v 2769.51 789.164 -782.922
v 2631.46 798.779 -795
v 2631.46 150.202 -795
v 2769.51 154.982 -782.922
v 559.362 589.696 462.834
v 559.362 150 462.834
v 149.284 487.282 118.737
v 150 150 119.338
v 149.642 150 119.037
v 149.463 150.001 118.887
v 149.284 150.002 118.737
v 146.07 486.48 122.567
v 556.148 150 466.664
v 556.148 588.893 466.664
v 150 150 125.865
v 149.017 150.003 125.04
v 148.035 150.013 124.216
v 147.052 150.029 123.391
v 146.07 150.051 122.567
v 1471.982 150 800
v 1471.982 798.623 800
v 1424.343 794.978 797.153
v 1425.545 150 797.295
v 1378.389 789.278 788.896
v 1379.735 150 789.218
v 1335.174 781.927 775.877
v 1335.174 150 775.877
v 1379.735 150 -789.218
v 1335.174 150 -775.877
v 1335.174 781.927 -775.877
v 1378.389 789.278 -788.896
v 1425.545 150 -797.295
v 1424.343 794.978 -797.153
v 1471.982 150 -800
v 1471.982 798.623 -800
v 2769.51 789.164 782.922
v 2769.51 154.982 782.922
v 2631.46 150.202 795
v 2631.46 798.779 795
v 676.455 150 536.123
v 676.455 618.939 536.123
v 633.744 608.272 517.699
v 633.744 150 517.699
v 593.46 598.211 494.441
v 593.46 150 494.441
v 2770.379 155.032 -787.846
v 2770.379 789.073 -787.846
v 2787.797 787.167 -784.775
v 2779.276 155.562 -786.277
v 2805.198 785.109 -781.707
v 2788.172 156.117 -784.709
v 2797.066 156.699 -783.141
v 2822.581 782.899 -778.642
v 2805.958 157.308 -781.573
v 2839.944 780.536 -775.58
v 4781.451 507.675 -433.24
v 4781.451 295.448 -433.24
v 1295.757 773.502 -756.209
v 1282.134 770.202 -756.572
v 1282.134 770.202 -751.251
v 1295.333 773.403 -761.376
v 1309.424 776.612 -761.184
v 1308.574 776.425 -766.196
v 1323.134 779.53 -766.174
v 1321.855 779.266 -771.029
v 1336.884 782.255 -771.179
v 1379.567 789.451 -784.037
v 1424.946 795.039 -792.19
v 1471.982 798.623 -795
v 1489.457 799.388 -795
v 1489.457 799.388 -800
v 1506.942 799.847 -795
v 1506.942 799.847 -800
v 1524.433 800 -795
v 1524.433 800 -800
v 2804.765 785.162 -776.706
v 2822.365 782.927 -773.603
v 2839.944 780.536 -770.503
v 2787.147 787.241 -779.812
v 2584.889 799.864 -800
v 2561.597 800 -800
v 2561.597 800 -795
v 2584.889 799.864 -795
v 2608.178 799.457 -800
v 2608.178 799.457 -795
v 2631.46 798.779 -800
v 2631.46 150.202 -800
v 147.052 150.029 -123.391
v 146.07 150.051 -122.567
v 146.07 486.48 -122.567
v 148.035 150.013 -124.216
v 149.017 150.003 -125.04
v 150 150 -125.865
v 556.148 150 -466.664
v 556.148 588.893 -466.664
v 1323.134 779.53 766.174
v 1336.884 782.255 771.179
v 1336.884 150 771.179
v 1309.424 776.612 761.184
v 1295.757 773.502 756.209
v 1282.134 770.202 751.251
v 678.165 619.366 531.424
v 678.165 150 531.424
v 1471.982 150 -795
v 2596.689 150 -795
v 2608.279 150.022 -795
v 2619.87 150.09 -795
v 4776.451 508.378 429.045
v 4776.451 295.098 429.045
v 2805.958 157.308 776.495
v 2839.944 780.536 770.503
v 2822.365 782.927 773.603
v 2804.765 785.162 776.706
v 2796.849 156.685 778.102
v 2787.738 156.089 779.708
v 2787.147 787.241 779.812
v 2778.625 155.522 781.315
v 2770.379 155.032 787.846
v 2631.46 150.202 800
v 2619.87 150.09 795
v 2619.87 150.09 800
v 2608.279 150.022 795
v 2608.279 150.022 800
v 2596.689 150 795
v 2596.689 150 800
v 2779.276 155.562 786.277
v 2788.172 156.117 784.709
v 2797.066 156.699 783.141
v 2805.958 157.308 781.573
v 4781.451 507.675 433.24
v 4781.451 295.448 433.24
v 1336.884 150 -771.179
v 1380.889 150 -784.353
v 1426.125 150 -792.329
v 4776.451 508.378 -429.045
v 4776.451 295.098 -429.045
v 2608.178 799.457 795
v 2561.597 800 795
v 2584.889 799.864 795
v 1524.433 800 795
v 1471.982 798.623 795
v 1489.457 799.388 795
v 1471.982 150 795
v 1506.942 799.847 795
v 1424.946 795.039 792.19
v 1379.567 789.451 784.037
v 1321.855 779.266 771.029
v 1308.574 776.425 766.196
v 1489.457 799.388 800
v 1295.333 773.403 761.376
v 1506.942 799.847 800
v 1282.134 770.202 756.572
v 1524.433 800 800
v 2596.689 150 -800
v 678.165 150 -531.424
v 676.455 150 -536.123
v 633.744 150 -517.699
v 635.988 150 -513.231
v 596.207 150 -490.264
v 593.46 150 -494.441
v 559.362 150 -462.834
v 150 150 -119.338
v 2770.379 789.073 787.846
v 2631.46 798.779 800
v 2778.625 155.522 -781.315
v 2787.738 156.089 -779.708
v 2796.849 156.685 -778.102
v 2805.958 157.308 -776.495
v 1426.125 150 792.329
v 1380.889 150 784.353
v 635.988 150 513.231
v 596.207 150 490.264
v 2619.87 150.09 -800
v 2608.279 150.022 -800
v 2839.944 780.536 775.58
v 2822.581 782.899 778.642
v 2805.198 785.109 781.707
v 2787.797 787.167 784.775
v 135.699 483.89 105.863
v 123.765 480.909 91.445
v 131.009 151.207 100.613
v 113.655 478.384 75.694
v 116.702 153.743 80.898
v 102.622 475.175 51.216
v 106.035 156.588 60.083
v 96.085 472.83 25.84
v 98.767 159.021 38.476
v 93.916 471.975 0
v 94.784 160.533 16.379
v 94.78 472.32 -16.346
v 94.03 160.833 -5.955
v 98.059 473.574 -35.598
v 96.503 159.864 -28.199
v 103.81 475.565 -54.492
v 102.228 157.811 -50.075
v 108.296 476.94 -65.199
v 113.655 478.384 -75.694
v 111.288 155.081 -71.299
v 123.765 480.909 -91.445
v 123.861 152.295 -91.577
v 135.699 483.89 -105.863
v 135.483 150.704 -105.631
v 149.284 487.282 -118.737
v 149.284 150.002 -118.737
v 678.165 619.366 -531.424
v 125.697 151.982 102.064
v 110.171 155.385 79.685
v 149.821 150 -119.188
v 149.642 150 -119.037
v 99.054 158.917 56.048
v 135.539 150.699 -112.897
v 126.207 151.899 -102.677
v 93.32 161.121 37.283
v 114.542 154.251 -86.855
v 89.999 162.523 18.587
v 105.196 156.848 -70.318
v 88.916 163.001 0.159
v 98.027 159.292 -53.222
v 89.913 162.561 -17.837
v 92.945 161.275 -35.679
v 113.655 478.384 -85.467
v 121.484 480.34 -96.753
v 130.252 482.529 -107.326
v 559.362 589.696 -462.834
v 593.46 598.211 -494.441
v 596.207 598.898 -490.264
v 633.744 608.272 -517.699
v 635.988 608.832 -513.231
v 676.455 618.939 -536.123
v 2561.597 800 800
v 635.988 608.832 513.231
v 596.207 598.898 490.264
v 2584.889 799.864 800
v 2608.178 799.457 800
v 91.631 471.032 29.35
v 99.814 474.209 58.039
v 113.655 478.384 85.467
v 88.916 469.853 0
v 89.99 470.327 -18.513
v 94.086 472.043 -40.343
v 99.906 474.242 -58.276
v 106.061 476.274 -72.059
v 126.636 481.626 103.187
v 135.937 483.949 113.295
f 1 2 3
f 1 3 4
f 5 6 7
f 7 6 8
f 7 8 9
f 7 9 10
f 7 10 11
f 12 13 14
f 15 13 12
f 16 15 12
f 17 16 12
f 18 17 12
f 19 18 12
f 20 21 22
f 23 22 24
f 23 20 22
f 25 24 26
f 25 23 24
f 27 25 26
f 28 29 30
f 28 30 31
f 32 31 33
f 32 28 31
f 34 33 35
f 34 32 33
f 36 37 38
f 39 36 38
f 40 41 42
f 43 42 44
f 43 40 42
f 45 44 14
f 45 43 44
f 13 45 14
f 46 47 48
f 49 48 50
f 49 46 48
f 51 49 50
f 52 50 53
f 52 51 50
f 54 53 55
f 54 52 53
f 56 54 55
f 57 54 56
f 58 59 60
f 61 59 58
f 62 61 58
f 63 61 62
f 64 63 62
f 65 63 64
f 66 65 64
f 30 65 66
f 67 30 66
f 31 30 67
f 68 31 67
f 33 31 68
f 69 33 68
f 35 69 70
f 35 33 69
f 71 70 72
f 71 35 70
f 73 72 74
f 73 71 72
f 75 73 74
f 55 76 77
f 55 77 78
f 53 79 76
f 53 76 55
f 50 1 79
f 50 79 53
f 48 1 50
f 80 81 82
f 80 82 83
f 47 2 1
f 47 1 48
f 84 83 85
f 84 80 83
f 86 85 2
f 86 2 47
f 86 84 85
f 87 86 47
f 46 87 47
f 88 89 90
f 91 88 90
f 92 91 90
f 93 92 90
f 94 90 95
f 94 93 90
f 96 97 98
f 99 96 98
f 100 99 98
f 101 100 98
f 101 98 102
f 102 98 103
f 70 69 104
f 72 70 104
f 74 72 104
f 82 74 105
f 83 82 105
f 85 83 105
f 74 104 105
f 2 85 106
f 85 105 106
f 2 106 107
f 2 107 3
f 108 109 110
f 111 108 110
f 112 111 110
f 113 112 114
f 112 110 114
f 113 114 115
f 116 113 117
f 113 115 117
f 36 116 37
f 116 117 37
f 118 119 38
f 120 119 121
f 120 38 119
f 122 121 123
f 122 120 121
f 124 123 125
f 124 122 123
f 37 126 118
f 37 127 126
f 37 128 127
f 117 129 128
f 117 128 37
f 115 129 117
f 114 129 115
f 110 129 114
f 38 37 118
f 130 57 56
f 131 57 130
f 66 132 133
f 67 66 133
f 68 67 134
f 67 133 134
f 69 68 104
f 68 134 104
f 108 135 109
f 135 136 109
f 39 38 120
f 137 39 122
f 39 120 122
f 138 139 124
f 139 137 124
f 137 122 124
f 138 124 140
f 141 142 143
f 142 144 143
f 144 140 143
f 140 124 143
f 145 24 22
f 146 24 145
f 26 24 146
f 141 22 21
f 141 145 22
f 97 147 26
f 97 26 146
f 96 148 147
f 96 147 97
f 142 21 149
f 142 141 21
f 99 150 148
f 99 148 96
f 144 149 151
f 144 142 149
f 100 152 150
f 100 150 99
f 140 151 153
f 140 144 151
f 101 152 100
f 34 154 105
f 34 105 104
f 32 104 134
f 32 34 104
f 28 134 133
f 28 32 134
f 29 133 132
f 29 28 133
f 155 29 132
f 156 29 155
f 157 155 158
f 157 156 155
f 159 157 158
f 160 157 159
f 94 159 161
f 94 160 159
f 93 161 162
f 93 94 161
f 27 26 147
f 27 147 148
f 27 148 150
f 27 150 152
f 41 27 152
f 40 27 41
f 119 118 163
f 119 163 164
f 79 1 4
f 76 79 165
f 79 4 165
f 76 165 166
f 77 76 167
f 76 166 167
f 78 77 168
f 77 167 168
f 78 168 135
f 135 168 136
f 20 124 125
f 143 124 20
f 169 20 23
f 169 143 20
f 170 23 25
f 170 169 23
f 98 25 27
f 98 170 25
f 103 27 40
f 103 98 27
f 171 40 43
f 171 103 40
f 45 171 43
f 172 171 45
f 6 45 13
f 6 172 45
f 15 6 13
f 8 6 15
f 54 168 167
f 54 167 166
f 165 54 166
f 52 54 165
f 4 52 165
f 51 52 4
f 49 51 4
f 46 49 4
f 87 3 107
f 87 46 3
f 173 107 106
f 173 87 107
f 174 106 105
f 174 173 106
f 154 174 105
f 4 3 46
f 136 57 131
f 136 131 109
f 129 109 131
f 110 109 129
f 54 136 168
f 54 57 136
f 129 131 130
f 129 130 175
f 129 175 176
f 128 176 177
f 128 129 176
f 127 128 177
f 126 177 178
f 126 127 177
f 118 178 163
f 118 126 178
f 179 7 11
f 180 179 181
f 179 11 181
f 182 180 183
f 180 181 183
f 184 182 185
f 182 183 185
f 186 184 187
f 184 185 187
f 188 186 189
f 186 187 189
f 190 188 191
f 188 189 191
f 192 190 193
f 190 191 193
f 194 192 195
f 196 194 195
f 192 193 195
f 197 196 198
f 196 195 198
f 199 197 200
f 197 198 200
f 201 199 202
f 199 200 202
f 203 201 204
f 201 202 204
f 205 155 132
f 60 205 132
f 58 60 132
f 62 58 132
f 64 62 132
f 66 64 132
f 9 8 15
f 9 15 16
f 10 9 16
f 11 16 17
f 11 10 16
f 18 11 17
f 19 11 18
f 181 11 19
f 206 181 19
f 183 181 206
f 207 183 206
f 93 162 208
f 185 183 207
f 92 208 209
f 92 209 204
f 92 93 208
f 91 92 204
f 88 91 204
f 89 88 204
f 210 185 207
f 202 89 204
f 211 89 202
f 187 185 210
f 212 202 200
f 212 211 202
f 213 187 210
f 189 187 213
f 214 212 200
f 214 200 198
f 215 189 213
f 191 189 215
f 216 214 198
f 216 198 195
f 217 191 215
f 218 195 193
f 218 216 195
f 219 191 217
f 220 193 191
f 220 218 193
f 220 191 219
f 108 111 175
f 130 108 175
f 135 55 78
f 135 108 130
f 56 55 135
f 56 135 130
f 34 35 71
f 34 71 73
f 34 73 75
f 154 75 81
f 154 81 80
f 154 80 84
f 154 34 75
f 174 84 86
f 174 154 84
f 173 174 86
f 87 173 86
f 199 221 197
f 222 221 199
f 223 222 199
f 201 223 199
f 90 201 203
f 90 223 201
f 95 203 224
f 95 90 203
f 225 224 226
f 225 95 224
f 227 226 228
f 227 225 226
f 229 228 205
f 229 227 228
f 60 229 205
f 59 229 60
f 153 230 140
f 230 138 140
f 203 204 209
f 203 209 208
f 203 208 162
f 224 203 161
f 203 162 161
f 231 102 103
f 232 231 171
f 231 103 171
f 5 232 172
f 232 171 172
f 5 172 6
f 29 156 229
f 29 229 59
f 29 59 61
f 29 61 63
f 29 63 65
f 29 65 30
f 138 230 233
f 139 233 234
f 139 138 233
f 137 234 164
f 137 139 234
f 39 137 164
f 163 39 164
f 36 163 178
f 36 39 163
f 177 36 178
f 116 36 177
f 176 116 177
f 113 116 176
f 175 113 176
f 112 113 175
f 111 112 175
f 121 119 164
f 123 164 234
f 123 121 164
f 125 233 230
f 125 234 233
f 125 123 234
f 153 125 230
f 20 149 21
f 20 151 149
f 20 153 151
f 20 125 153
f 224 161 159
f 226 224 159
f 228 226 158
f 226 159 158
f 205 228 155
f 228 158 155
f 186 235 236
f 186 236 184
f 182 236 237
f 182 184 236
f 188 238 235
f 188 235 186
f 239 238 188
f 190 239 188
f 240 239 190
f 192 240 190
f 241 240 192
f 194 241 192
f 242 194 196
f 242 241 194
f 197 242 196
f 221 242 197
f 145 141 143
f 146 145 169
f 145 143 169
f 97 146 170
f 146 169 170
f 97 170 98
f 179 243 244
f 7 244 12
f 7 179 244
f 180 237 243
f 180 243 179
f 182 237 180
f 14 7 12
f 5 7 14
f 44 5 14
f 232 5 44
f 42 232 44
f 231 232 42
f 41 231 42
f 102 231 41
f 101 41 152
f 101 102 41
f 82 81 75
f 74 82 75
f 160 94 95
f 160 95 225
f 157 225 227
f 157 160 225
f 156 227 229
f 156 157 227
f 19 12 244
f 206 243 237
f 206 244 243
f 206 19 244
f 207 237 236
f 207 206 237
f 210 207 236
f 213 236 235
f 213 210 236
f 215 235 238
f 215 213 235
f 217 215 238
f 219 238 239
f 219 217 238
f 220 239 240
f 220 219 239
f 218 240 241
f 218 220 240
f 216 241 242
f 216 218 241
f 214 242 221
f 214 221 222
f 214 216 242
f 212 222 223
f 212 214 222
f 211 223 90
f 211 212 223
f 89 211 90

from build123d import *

# Parameters (mm, degrees)
TOPVIEW_EXTRUDE_DEPTH      = 800
SHELL1_T                   = -5
SIDEPROFILE_CUT_DEPTH      = 4914.47877429
SIDEPROFILE_CUT_DEPTH_BACK = 4914.47877429
SKETCH2_OUTSIDE_W          = 5698.923
SKETCH2_OUTSIDE_H          = 1806.388


with BuildPart() as part:
    # Sketch1 → TopView_Extrude (new body)
    with BuildSketch(Plane(origin=(0, 0, 0), x_dir=(1, 0, 0), z_dir=(0, 1, 0))):
        with BuildLine():
            Line((146.069849076, 122.567124227), (556.148324977, 466.663731547))
            ThreePointArc((556.148324977, 466.663731547), (613.263316637, 506.656075273), (676.455195963, 536.122941687))
            Line((676.455195963, 536.122941687), (1335.173700718, 775.877020708))
            ThreePointArc((1335.173700718, 775.877020708), (1402.522523085, 793.923094197), (1471.981833896, 800))
            Line((1471.981833896, 800), (2631.460091708, 800))
            ThreePointArc((2631.460091708, 800), (2701.184663634, 796.955760422), (2770.378589806, 787.846210174))
            Line((2770.378589806, 787.846210174), (4781.451, 433.24))
            Line((4781.451, 433.24), (4781.451, -433.24))
            Line((4781.451, -433.24), (2770.378589806, -787.846210174))
            ThreePointArc((2770.378589806, -787.846210174), (2701.184663634, -796.955760422), (2631.460091708, -800))
            Line((2631.460091708, -800), (1471.981833896, -800))
            ThreePointArc((1471.981833896, -800), (1402.522523085, -793.923094197), (1335.173700718, -775.877020708))
            Line((1335.173700718, -775.877020708), (676.455195963, -536.122941687))
            ThreePointArc((676.455195963, -536.122941687), (613.263316637, -506.656075273), (556.148324977, -466.663731547))
            Line((556.148324977, -466.663731547), (146.069849076, -122.567124227))
            ThreePointArc((146.069849076, -122.567124227), (88.915850742, 0), (146.069849076, 122.567124227))
        make_face()
    extrude(amount=TOPVIEW_EXTRUDE_DEPTH)

    # Shell1
    shell1_openings = [part.faces().sort_by_distance(p)[0] for p in [
        (2472.186486347, 0, 0),
        (2472.186486347, 800, 0),
    ]]
    offset(amount=SHELL1_T, openings=shell1_openings, kind=Kind.INTERSECTION)

    # Sketch2 outside → SideProfile_Cut (cut, two sides: drawn at the far end of the back side and taken through both)
    with BuildSketch(Plane.XY.offset(-SIDEPROFILE_CUT_DEPTH_BACK)):
        with Locations((2435.1835, 400)):
            Rectangle(SKETCH2_OUTSIDE_W, SKETCH2_OUTSIDE_H)
        with BuildLine():
            Line((0, 300), (0, 332.854125267))
            ThreePointArc((0, 332.854125267), (31.780430043, 425.180358155), (113.65511039, 478.384359237))
            Line((113.65511039, 478.384359237), (1282.133703367, 770.201559797))
            ThreePointArc((1282.133703367, 770.201559797), (1402.370605908, 792.522432945), (1524.432967436, 800))
            Line((1524.432967436, 800), (2561.597345878, 800))
            ThreePointArc((2561.597345878, 800), (2701.110323381, 795.128098421), (2839.943607388, 780.536129108))
            Line((2839.943607388, 780.536129108), (4781.451, 507.675))
            Line((4781.451, 507.675), (4781.451, 295.448))
            Line((4781.451, 295.448), (2805.958277636, 157.307872364))
            ThreePointArc((2805.958277636, 157.307872364), (2701.387181329, 151.827524732), (2596.688525433, 150))
            Line((2596.688525433, 150), (150, 150))
            ThreePointArc((150, 150), (43.933982822, 193.933982822), (0, 300))
        make_face(mode=Mode.SUBTRACT)
    extrude(amount=SIDEPROFILE_CUT_DEPTH + SIDEPROFILE_CUT_DEPTH_BACK, mode=Mode.SUBTRACT)


solid = part.part
